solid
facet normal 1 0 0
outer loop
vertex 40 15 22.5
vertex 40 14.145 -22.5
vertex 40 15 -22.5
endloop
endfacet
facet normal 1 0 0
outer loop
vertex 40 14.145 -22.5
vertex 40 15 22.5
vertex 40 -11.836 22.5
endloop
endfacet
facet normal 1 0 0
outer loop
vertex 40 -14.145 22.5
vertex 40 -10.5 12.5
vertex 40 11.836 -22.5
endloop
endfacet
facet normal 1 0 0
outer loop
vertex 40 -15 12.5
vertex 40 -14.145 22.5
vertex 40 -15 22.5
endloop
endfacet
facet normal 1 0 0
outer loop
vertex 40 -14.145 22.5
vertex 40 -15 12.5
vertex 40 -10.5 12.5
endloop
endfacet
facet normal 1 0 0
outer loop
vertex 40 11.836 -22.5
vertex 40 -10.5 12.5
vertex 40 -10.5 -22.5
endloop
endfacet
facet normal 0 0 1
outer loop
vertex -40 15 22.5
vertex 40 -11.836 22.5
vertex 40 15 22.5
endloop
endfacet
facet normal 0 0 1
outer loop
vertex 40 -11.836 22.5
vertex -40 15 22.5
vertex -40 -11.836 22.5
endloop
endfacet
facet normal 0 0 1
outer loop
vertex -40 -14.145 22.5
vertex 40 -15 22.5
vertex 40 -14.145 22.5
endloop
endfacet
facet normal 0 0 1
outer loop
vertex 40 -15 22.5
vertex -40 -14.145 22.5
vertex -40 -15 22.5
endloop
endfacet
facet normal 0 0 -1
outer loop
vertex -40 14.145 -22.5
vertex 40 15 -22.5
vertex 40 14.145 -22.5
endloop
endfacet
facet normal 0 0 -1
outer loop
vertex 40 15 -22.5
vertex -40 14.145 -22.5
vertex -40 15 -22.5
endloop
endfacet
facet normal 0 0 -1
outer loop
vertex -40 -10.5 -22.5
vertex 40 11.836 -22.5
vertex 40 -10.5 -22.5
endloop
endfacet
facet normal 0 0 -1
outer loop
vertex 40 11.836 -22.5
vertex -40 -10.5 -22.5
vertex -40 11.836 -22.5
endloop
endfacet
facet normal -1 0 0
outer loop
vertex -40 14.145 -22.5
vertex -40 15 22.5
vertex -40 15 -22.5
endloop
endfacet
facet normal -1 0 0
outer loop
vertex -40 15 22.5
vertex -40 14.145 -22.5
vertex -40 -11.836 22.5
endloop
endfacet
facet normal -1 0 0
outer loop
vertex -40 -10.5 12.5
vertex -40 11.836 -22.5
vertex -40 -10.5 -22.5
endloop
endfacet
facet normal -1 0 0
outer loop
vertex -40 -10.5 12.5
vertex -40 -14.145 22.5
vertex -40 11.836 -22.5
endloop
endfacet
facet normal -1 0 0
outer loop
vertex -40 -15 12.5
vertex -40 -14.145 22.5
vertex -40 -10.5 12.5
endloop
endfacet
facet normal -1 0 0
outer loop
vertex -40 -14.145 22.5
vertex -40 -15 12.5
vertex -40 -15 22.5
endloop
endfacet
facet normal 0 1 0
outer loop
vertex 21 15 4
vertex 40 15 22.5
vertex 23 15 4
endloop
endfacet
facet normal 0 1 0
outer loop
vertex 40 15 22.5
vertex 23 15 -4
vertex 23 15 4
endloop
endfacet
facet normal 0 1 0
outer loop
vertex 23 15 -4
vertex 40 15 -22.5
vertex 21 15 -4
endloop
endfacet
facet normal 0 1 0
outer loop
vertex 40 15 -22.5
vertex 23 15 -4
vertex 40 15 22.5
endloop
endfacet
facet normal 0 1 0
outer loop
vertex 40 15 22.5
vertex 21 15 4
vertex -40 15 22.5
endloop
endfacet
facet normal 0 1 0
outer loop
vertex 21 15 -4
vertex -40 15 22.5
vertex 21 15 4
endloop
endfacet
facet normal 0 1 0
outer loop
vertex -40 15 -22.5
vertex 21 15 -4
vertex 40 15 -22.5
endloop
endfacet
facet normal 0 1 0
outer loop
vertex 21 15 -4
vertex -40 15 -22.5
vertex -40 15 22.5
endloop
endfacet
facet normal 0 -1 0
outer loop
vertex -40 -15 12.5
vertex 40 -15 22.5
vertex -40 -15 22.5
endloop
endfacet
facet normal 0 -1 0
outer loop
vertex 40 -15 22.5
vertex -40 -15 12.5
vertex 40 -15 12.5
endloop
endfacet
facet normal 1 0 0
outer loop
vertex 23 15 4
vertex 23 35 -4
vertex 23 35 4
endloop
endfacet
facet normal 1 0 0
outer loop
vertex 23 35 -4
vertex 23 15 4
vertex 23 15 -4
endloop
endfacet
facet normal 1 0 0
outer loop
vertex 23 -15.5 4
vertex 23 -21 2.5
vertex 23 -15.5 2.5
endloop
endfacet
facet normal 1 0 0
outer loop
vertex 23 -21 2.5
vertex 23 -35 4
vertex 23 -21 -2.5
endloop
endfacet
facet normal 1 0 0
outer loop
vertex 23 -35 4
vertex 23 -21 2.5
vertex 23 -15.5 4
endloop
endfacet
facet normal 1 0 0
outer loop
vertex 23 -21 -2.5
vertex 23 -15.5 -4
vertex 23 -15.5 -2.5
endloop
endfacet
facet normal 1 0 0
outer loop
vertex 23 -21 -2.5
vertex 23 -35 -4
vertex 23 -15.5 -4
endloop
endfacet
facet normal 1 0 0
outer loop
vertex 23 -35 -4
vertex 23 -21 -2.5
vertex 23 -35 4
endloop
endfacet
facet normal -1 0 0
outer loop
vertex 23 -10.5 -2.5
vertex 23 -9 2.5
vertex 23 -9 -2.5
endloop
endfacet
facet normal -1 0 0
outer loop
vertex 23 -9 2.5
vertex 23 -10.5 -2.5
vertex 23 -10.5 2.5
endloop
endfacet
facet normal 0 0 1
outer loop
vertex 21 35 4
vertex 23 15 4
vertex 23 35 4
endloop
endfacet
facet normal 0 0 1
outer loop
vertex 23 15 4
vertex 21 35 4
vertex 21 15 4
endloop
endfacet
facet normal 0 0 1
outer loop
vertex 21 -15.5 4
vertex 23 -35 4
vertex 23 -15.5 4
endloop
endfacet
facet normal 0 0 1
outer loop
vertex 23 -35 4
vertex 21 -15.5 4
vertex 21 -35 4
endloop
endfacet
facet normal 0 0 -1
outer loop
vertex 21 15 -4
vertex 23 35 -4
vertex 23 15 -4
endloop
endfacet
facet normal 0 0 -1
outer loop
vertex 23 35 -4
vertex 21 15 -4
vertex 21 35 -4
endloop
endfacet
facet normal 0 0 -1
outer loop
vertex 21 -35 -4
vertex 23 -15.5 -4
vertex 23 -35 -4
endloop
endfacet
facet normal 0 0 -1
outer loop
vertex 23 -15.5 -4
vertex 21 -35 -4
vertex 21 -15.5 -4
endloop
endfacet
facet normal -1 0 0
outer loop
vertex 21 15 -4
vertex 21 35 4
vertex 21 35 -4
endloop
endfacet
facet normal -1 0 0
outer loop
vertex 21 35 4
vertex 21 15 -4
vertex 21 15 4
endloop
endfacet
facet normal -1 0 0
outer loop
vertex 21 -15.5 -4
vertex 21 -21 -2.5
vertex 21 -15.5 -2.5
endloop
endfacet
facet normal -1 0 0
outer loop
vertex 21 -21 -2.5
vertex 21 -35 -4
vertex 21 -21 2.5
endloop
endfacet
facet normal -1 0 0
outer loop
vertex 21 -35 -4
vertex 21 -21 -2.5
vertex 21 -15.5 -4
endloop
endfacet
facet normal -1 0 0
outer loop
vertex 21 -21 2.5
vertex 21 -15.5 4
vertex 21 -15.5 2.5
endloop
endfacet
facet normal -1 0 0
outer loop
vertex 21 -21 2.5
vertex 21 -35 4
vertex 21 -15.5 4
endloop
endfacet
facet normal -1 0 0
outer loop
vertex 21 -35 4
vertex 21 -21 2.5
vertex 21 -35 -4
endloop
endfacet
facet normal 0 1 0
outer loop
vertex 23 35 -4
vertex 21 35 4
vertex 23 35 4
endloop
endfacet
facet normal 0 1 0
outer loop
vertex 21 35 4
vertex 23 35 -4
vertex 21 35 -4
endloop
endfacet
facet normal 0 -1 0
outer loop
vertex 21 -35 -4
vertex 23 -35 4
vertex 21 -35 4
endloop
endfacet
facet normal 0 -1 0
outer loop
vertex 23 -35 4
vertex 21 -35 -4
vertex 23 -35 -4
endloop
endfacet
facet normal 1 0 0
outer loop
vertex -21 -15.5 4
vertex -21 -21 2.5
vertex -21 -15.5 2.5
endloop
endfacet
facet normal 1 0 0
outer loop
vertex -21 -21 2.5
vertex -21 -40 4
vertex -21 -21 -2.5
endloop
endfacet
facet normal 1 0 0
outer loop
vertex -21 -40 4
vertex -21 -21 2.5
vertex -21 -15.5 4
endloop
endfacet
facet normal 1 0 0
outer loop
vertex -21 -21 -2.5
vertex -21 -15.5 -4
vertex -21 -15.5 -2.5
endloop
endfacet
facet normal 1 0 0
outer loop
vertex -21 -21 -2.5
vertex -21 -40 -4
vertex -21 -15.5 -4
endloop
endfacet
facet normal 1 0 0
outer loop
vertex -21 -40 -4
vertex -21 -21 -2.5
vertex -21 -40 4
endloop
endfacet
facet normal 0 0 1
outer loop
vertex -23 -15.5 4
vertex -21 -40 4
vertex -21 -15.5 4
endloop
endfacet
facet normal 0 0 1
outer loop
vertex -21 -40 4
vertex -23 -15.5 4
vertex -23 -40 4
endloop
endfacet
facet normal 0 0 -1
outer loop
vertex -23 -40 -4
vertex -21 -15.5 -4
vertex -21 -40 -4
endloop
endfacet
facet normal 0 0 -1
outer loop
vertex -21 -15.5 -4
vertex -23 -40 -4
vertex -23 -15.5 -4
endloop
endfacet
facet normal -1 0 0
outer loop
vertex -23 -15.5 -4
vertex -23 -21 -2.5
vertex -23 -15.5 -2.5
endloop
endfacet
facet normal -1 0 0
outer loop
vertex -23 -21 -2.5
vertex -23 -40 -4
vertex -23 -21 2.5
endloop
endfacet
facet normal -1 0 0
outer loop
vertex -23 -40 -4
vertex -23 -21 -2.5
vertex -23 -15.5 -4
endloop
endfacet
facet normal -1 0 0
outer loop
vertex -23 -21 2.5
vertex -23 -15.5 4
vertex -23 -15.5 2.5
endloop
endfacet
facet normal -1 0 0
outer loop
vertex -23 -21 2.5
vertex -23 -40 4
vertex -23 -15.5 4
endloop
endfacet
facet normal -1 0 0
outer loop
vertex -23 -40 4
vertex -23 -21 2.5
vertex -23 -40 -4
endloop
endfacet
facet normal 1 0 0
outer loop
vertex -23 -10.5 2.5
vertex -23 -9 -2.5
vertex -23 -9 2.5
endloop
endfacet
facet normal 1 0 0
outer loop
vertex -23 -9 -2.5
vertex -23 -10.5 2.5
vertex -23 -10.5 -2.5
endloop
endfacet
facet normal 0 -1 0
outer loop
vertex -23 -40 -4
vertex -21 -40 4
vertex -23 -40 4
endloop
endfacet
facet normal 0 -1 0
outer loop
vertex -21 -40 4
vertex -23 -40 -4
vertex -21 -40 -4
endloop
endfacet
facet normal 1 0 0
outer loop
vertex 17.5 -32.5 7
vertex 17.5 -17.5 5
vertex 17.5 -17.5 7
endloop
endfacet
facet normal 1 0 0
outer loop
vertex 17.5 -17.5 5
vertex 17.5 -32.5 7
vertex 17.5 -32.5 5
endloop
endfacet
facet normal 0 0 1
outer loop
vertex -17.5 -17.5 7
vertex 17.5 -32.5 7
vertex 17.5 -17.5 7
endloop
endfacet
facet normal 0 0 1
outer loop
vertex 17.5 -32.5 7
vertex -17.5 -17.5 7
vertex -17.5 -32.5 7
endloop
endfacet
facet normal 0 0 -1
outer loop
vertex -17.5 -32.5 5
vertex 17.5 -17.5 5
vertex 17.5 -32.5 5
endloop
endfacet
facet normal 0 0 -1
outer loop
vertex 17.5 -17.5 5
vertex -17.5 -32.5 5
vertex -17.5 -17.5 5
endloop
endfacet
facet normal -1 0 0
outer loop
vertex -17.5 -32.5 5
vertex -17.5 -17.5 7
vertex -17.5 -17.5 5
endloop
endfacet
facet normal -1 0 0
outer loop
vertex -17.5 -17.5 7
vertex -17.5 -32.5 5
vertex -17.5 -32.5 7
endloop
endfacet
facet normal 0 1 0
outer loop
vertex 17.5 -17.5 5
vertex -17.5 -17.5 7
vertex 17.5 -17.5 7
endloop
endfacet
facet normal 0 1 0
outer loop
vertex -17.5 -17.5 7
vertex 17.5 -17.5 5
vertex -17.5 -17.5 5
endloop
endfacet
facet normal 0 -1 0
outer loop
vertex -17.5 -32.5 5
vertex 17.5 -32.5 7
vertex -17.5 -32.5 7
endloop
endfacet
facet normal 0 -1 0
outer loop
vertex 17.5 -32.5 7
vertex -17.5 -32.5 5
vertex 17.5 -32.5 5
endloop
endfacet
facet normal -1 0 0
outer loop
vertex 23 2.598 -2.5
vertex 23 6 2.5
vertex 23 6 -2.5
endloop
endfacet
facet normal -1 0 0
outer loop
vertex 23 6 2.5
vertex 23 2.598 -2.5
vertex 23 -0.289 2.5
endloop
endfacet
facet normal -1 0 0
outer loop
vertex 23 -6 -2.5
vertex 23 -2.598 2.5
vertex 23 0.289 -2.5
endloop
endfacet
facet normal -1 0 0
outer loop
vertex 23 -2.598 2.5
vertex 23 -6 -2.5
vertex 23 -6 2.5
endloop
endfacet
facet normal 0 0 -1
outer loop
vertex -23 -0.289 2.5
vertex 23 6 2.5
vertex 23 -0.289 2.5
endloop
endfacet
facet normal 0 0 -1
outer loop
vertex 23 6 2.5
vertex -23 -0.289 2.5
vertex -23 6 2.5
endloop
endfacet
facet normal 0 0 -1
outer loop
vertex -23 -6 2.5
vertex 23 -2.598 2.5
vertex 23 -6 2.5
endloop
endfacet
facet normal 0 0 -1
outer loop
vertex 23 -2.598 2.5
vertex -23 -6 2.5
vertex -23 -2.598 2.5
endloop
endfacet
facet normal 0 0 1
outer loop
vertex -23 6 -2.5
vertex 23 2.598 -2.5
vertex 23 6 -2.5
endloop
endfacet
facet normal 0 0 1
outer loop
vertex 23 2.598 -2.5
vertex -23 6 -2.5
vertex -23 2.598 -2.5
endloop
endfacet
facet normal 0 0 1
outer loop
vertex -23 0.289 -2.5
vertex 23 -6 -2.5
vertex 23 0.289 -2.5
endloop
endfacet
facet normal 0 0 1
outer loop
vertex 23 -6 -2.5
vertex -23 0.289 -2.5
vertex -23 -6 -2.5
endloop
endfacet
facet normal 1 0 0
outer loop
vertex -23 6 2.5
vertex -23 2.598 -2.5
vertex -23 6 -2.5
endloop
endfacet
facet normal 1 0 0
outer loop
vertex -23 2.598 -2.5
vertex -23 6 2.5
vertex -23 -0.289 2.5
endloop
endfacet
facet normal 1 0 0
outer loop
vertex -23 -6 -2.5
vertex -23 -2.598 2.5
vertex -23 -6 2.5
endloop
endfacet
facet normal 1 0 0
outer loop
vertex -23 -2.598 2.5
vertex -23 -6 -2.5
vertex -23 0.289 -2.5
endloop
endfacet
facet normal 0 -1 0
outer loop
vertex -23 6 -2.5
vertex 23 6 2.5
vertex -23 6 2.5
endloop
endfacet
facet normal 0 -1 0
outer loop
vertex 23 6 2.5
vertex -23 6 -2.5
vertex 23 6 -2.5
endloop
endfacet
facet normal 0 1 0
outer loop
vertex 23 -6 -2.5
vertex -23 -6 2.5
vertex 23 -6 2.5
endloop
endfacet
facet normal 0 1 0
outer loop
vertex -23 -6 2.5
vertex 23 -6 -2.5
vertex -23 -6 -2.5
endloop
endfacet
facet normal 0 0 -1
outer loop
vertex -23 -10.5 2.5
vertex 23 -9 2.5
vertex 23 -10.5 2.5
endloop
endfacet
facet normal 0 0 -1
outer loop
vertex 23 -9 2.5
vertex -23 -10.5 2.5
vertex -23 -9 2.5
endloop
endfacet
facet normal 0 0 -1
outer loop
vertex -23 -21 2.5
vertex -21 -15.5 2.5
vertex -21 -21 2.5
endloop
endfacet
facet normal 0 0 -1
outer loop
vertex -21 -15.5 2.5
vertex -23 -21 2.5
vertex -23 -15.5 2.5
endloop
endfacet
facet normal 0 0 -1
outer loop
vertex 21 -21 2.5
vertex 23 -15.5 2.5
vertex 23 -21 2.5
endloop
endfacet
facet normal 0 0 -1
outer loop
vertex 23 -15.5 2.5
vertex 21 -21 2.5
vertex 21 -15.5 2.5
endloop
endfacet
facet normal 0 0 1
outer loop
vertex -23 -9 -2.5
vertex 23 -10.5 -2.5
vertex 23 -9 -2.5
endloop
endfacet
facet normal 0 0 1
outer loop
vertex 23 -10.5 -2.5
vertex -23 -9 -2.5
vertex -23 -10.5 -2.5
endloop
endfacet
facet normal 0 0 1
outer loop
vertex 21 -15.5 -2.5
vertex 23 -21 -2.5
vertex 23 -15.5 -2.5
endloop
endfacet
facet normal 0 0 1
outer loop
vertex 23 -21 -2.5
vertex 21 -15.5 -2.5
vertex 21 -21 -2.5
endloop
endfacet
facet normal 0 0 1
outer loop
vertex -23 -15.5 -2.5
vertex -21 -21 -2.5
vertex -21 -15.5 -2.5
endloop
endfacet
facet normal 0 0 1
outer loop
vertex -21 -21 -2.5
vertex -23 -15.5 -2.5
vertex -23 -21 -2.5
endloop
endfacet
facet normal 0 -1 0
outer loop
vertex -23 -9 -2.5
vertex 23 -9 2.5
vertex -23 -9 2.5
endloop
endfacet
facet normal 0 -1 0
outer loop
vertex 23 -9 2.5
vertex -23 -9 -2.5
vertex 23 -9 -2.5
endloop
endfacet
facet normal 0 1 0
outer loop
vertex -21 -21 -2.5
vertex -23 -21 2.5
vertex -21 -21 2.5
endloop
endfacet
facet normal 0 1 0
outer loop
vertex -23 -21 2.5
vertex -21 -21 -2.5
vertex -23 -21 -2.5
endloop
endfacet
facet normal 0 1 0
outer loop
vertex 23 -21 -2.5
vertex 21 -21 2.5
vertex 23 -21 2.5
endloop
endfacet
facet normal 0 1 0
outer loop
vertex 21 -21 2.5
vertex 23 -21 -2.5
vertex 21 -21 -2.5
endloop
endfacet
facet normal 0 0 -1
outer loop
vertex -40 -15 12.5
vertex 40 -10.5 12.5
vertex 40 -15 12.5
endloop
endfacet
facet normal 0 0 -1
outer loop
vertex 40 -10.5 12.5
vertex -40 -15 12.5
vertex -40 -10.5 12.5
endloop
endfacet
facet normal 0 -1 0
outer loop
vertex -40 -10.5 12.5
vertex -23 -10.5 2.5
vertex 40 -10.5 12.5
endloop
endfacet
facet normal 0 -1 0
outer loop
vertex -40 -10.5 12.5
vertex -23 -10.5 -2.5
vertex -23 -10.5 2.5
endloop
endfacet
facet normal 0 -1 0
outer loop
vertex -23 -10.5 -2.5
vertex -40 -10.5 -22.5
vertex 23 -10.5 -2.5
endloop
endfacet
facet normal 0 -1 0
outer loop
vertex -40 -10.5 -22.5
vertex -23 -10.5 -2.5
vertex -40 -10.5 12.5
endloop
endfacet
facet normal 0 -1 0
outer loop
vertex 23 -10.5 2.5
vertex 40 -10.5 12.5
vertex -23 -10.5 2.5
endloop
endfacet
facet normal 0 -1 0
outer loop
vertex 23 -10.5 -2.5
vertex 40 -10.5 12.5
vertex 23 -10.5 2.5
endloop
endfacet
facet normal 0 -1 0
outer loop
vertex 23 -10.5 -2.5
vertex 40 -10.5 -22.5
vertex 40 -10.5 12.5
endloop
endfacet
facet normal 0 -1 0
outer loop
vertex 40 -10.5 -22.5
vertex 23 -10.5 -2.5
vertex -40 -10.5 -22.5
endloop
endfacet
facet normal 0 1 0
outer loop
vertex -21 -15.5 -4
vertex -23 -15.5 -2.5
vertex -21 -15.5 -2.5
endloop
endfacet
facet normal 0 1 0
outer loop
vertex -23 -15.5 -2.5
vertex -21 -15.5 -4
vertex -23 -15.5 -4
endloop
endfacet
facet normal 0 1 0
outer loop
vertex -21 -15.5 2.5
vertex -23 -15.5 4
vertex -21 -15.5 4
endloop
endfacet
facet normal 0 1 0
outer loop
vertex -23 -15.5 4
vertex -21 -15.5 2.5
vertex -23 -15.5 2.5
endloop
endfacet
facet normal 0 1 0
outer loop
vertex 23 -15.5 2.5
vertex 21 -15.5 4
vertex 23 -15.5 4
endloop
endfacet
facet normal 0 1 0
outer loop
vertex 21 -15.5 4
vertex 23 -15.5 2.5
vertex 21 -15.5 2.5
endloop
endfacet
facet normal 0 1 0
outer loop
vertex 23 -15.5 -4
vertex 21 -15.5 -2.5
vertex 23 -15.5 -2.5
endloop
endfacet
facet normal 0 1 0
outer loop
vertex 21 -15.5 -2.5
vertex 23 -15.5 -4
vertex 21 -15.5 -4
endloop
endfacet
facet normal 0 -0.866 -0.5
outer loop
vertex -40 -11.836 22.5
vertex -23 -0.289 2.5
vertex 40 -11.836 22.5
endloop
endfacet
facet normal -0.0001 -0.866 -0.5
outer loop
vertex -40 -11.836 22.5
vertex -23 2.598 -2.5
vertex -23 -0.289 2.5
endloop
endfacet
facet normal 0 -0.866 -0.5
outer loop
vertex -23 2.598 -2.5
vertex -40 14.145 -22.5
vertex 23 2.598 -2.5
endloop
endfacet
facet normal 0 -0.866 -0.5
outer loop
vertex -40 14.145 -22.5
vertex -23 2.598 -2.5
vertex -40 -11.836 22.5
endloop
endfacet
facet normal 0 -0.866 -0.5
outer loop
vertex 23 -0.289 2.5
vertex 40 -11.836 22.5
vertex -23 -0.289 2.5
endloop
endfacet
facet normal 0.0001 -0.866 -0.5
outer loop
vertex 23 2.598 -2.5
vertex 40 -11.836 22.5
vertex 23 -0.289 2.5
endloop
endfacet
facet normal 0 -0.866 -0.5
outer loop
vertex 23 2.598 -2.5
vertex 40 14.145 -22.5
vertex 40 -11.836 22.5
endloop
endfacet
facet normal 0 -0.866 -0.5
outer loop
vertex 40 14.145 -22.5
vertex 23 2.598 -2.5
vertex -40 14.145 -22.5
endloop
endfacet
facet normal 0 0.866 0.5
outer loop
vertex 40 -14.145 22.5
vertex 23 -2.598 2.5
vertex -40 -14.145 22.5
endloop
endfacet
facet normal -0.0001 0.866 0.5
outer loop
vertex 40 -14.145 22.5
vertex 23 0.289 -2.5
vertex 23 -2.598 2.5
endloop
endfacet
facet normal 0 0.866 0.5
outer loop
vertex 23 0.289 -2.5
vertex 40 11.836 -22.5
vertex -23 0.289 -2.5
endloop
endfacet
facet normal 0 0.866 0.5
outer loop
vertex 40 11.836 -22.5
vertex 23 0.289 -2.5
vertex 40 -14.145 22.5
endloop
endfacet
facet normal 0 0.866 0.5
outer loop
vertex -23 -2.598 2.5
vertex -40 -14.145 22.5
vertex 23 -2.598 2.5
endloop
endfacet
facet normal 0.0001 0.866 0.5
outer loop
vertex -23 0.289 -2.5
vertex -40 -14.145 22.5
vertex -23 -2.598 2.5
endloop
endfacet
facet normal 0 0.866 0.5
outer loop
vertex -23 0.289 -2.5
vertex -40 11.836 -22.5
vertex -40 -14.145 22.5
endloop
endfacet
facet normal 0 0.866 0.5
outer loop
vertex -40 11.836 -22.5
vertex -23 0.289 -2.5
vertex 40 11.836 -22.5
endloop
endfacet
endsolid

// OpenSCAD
//!OpenSCAD

module repressor_blade()
{
	difference() {
		union() {
			cube([80, 30, 45], center = true);
            translate([22,0,0]){
                cube([2, 70, 8], center = true);
            }
            translate([-22,-15,0]){
                cube([2, 50, 8], center = true);
            }
            translate([0,-25,6]){
			    cube([35, 15, 2], center = true);   
            }
		}
        translate([-11.5,33,0]){
	        cube([23, 25, 12], center = true);
        }
        translate([0,0,0]){
		    cube([46, 12, 5], center = true);
	    }
        translate([0,-15,0]){
            cube([46, 12, 5], center = true);
	    }
        translate([0,-13,-5]){
            cube([80, 5, 35], center = true);
        }
        rotate([-60,0,0]){
                cube([80, 55, 2], center = true);
        }
	}
}

repressor_blade();
